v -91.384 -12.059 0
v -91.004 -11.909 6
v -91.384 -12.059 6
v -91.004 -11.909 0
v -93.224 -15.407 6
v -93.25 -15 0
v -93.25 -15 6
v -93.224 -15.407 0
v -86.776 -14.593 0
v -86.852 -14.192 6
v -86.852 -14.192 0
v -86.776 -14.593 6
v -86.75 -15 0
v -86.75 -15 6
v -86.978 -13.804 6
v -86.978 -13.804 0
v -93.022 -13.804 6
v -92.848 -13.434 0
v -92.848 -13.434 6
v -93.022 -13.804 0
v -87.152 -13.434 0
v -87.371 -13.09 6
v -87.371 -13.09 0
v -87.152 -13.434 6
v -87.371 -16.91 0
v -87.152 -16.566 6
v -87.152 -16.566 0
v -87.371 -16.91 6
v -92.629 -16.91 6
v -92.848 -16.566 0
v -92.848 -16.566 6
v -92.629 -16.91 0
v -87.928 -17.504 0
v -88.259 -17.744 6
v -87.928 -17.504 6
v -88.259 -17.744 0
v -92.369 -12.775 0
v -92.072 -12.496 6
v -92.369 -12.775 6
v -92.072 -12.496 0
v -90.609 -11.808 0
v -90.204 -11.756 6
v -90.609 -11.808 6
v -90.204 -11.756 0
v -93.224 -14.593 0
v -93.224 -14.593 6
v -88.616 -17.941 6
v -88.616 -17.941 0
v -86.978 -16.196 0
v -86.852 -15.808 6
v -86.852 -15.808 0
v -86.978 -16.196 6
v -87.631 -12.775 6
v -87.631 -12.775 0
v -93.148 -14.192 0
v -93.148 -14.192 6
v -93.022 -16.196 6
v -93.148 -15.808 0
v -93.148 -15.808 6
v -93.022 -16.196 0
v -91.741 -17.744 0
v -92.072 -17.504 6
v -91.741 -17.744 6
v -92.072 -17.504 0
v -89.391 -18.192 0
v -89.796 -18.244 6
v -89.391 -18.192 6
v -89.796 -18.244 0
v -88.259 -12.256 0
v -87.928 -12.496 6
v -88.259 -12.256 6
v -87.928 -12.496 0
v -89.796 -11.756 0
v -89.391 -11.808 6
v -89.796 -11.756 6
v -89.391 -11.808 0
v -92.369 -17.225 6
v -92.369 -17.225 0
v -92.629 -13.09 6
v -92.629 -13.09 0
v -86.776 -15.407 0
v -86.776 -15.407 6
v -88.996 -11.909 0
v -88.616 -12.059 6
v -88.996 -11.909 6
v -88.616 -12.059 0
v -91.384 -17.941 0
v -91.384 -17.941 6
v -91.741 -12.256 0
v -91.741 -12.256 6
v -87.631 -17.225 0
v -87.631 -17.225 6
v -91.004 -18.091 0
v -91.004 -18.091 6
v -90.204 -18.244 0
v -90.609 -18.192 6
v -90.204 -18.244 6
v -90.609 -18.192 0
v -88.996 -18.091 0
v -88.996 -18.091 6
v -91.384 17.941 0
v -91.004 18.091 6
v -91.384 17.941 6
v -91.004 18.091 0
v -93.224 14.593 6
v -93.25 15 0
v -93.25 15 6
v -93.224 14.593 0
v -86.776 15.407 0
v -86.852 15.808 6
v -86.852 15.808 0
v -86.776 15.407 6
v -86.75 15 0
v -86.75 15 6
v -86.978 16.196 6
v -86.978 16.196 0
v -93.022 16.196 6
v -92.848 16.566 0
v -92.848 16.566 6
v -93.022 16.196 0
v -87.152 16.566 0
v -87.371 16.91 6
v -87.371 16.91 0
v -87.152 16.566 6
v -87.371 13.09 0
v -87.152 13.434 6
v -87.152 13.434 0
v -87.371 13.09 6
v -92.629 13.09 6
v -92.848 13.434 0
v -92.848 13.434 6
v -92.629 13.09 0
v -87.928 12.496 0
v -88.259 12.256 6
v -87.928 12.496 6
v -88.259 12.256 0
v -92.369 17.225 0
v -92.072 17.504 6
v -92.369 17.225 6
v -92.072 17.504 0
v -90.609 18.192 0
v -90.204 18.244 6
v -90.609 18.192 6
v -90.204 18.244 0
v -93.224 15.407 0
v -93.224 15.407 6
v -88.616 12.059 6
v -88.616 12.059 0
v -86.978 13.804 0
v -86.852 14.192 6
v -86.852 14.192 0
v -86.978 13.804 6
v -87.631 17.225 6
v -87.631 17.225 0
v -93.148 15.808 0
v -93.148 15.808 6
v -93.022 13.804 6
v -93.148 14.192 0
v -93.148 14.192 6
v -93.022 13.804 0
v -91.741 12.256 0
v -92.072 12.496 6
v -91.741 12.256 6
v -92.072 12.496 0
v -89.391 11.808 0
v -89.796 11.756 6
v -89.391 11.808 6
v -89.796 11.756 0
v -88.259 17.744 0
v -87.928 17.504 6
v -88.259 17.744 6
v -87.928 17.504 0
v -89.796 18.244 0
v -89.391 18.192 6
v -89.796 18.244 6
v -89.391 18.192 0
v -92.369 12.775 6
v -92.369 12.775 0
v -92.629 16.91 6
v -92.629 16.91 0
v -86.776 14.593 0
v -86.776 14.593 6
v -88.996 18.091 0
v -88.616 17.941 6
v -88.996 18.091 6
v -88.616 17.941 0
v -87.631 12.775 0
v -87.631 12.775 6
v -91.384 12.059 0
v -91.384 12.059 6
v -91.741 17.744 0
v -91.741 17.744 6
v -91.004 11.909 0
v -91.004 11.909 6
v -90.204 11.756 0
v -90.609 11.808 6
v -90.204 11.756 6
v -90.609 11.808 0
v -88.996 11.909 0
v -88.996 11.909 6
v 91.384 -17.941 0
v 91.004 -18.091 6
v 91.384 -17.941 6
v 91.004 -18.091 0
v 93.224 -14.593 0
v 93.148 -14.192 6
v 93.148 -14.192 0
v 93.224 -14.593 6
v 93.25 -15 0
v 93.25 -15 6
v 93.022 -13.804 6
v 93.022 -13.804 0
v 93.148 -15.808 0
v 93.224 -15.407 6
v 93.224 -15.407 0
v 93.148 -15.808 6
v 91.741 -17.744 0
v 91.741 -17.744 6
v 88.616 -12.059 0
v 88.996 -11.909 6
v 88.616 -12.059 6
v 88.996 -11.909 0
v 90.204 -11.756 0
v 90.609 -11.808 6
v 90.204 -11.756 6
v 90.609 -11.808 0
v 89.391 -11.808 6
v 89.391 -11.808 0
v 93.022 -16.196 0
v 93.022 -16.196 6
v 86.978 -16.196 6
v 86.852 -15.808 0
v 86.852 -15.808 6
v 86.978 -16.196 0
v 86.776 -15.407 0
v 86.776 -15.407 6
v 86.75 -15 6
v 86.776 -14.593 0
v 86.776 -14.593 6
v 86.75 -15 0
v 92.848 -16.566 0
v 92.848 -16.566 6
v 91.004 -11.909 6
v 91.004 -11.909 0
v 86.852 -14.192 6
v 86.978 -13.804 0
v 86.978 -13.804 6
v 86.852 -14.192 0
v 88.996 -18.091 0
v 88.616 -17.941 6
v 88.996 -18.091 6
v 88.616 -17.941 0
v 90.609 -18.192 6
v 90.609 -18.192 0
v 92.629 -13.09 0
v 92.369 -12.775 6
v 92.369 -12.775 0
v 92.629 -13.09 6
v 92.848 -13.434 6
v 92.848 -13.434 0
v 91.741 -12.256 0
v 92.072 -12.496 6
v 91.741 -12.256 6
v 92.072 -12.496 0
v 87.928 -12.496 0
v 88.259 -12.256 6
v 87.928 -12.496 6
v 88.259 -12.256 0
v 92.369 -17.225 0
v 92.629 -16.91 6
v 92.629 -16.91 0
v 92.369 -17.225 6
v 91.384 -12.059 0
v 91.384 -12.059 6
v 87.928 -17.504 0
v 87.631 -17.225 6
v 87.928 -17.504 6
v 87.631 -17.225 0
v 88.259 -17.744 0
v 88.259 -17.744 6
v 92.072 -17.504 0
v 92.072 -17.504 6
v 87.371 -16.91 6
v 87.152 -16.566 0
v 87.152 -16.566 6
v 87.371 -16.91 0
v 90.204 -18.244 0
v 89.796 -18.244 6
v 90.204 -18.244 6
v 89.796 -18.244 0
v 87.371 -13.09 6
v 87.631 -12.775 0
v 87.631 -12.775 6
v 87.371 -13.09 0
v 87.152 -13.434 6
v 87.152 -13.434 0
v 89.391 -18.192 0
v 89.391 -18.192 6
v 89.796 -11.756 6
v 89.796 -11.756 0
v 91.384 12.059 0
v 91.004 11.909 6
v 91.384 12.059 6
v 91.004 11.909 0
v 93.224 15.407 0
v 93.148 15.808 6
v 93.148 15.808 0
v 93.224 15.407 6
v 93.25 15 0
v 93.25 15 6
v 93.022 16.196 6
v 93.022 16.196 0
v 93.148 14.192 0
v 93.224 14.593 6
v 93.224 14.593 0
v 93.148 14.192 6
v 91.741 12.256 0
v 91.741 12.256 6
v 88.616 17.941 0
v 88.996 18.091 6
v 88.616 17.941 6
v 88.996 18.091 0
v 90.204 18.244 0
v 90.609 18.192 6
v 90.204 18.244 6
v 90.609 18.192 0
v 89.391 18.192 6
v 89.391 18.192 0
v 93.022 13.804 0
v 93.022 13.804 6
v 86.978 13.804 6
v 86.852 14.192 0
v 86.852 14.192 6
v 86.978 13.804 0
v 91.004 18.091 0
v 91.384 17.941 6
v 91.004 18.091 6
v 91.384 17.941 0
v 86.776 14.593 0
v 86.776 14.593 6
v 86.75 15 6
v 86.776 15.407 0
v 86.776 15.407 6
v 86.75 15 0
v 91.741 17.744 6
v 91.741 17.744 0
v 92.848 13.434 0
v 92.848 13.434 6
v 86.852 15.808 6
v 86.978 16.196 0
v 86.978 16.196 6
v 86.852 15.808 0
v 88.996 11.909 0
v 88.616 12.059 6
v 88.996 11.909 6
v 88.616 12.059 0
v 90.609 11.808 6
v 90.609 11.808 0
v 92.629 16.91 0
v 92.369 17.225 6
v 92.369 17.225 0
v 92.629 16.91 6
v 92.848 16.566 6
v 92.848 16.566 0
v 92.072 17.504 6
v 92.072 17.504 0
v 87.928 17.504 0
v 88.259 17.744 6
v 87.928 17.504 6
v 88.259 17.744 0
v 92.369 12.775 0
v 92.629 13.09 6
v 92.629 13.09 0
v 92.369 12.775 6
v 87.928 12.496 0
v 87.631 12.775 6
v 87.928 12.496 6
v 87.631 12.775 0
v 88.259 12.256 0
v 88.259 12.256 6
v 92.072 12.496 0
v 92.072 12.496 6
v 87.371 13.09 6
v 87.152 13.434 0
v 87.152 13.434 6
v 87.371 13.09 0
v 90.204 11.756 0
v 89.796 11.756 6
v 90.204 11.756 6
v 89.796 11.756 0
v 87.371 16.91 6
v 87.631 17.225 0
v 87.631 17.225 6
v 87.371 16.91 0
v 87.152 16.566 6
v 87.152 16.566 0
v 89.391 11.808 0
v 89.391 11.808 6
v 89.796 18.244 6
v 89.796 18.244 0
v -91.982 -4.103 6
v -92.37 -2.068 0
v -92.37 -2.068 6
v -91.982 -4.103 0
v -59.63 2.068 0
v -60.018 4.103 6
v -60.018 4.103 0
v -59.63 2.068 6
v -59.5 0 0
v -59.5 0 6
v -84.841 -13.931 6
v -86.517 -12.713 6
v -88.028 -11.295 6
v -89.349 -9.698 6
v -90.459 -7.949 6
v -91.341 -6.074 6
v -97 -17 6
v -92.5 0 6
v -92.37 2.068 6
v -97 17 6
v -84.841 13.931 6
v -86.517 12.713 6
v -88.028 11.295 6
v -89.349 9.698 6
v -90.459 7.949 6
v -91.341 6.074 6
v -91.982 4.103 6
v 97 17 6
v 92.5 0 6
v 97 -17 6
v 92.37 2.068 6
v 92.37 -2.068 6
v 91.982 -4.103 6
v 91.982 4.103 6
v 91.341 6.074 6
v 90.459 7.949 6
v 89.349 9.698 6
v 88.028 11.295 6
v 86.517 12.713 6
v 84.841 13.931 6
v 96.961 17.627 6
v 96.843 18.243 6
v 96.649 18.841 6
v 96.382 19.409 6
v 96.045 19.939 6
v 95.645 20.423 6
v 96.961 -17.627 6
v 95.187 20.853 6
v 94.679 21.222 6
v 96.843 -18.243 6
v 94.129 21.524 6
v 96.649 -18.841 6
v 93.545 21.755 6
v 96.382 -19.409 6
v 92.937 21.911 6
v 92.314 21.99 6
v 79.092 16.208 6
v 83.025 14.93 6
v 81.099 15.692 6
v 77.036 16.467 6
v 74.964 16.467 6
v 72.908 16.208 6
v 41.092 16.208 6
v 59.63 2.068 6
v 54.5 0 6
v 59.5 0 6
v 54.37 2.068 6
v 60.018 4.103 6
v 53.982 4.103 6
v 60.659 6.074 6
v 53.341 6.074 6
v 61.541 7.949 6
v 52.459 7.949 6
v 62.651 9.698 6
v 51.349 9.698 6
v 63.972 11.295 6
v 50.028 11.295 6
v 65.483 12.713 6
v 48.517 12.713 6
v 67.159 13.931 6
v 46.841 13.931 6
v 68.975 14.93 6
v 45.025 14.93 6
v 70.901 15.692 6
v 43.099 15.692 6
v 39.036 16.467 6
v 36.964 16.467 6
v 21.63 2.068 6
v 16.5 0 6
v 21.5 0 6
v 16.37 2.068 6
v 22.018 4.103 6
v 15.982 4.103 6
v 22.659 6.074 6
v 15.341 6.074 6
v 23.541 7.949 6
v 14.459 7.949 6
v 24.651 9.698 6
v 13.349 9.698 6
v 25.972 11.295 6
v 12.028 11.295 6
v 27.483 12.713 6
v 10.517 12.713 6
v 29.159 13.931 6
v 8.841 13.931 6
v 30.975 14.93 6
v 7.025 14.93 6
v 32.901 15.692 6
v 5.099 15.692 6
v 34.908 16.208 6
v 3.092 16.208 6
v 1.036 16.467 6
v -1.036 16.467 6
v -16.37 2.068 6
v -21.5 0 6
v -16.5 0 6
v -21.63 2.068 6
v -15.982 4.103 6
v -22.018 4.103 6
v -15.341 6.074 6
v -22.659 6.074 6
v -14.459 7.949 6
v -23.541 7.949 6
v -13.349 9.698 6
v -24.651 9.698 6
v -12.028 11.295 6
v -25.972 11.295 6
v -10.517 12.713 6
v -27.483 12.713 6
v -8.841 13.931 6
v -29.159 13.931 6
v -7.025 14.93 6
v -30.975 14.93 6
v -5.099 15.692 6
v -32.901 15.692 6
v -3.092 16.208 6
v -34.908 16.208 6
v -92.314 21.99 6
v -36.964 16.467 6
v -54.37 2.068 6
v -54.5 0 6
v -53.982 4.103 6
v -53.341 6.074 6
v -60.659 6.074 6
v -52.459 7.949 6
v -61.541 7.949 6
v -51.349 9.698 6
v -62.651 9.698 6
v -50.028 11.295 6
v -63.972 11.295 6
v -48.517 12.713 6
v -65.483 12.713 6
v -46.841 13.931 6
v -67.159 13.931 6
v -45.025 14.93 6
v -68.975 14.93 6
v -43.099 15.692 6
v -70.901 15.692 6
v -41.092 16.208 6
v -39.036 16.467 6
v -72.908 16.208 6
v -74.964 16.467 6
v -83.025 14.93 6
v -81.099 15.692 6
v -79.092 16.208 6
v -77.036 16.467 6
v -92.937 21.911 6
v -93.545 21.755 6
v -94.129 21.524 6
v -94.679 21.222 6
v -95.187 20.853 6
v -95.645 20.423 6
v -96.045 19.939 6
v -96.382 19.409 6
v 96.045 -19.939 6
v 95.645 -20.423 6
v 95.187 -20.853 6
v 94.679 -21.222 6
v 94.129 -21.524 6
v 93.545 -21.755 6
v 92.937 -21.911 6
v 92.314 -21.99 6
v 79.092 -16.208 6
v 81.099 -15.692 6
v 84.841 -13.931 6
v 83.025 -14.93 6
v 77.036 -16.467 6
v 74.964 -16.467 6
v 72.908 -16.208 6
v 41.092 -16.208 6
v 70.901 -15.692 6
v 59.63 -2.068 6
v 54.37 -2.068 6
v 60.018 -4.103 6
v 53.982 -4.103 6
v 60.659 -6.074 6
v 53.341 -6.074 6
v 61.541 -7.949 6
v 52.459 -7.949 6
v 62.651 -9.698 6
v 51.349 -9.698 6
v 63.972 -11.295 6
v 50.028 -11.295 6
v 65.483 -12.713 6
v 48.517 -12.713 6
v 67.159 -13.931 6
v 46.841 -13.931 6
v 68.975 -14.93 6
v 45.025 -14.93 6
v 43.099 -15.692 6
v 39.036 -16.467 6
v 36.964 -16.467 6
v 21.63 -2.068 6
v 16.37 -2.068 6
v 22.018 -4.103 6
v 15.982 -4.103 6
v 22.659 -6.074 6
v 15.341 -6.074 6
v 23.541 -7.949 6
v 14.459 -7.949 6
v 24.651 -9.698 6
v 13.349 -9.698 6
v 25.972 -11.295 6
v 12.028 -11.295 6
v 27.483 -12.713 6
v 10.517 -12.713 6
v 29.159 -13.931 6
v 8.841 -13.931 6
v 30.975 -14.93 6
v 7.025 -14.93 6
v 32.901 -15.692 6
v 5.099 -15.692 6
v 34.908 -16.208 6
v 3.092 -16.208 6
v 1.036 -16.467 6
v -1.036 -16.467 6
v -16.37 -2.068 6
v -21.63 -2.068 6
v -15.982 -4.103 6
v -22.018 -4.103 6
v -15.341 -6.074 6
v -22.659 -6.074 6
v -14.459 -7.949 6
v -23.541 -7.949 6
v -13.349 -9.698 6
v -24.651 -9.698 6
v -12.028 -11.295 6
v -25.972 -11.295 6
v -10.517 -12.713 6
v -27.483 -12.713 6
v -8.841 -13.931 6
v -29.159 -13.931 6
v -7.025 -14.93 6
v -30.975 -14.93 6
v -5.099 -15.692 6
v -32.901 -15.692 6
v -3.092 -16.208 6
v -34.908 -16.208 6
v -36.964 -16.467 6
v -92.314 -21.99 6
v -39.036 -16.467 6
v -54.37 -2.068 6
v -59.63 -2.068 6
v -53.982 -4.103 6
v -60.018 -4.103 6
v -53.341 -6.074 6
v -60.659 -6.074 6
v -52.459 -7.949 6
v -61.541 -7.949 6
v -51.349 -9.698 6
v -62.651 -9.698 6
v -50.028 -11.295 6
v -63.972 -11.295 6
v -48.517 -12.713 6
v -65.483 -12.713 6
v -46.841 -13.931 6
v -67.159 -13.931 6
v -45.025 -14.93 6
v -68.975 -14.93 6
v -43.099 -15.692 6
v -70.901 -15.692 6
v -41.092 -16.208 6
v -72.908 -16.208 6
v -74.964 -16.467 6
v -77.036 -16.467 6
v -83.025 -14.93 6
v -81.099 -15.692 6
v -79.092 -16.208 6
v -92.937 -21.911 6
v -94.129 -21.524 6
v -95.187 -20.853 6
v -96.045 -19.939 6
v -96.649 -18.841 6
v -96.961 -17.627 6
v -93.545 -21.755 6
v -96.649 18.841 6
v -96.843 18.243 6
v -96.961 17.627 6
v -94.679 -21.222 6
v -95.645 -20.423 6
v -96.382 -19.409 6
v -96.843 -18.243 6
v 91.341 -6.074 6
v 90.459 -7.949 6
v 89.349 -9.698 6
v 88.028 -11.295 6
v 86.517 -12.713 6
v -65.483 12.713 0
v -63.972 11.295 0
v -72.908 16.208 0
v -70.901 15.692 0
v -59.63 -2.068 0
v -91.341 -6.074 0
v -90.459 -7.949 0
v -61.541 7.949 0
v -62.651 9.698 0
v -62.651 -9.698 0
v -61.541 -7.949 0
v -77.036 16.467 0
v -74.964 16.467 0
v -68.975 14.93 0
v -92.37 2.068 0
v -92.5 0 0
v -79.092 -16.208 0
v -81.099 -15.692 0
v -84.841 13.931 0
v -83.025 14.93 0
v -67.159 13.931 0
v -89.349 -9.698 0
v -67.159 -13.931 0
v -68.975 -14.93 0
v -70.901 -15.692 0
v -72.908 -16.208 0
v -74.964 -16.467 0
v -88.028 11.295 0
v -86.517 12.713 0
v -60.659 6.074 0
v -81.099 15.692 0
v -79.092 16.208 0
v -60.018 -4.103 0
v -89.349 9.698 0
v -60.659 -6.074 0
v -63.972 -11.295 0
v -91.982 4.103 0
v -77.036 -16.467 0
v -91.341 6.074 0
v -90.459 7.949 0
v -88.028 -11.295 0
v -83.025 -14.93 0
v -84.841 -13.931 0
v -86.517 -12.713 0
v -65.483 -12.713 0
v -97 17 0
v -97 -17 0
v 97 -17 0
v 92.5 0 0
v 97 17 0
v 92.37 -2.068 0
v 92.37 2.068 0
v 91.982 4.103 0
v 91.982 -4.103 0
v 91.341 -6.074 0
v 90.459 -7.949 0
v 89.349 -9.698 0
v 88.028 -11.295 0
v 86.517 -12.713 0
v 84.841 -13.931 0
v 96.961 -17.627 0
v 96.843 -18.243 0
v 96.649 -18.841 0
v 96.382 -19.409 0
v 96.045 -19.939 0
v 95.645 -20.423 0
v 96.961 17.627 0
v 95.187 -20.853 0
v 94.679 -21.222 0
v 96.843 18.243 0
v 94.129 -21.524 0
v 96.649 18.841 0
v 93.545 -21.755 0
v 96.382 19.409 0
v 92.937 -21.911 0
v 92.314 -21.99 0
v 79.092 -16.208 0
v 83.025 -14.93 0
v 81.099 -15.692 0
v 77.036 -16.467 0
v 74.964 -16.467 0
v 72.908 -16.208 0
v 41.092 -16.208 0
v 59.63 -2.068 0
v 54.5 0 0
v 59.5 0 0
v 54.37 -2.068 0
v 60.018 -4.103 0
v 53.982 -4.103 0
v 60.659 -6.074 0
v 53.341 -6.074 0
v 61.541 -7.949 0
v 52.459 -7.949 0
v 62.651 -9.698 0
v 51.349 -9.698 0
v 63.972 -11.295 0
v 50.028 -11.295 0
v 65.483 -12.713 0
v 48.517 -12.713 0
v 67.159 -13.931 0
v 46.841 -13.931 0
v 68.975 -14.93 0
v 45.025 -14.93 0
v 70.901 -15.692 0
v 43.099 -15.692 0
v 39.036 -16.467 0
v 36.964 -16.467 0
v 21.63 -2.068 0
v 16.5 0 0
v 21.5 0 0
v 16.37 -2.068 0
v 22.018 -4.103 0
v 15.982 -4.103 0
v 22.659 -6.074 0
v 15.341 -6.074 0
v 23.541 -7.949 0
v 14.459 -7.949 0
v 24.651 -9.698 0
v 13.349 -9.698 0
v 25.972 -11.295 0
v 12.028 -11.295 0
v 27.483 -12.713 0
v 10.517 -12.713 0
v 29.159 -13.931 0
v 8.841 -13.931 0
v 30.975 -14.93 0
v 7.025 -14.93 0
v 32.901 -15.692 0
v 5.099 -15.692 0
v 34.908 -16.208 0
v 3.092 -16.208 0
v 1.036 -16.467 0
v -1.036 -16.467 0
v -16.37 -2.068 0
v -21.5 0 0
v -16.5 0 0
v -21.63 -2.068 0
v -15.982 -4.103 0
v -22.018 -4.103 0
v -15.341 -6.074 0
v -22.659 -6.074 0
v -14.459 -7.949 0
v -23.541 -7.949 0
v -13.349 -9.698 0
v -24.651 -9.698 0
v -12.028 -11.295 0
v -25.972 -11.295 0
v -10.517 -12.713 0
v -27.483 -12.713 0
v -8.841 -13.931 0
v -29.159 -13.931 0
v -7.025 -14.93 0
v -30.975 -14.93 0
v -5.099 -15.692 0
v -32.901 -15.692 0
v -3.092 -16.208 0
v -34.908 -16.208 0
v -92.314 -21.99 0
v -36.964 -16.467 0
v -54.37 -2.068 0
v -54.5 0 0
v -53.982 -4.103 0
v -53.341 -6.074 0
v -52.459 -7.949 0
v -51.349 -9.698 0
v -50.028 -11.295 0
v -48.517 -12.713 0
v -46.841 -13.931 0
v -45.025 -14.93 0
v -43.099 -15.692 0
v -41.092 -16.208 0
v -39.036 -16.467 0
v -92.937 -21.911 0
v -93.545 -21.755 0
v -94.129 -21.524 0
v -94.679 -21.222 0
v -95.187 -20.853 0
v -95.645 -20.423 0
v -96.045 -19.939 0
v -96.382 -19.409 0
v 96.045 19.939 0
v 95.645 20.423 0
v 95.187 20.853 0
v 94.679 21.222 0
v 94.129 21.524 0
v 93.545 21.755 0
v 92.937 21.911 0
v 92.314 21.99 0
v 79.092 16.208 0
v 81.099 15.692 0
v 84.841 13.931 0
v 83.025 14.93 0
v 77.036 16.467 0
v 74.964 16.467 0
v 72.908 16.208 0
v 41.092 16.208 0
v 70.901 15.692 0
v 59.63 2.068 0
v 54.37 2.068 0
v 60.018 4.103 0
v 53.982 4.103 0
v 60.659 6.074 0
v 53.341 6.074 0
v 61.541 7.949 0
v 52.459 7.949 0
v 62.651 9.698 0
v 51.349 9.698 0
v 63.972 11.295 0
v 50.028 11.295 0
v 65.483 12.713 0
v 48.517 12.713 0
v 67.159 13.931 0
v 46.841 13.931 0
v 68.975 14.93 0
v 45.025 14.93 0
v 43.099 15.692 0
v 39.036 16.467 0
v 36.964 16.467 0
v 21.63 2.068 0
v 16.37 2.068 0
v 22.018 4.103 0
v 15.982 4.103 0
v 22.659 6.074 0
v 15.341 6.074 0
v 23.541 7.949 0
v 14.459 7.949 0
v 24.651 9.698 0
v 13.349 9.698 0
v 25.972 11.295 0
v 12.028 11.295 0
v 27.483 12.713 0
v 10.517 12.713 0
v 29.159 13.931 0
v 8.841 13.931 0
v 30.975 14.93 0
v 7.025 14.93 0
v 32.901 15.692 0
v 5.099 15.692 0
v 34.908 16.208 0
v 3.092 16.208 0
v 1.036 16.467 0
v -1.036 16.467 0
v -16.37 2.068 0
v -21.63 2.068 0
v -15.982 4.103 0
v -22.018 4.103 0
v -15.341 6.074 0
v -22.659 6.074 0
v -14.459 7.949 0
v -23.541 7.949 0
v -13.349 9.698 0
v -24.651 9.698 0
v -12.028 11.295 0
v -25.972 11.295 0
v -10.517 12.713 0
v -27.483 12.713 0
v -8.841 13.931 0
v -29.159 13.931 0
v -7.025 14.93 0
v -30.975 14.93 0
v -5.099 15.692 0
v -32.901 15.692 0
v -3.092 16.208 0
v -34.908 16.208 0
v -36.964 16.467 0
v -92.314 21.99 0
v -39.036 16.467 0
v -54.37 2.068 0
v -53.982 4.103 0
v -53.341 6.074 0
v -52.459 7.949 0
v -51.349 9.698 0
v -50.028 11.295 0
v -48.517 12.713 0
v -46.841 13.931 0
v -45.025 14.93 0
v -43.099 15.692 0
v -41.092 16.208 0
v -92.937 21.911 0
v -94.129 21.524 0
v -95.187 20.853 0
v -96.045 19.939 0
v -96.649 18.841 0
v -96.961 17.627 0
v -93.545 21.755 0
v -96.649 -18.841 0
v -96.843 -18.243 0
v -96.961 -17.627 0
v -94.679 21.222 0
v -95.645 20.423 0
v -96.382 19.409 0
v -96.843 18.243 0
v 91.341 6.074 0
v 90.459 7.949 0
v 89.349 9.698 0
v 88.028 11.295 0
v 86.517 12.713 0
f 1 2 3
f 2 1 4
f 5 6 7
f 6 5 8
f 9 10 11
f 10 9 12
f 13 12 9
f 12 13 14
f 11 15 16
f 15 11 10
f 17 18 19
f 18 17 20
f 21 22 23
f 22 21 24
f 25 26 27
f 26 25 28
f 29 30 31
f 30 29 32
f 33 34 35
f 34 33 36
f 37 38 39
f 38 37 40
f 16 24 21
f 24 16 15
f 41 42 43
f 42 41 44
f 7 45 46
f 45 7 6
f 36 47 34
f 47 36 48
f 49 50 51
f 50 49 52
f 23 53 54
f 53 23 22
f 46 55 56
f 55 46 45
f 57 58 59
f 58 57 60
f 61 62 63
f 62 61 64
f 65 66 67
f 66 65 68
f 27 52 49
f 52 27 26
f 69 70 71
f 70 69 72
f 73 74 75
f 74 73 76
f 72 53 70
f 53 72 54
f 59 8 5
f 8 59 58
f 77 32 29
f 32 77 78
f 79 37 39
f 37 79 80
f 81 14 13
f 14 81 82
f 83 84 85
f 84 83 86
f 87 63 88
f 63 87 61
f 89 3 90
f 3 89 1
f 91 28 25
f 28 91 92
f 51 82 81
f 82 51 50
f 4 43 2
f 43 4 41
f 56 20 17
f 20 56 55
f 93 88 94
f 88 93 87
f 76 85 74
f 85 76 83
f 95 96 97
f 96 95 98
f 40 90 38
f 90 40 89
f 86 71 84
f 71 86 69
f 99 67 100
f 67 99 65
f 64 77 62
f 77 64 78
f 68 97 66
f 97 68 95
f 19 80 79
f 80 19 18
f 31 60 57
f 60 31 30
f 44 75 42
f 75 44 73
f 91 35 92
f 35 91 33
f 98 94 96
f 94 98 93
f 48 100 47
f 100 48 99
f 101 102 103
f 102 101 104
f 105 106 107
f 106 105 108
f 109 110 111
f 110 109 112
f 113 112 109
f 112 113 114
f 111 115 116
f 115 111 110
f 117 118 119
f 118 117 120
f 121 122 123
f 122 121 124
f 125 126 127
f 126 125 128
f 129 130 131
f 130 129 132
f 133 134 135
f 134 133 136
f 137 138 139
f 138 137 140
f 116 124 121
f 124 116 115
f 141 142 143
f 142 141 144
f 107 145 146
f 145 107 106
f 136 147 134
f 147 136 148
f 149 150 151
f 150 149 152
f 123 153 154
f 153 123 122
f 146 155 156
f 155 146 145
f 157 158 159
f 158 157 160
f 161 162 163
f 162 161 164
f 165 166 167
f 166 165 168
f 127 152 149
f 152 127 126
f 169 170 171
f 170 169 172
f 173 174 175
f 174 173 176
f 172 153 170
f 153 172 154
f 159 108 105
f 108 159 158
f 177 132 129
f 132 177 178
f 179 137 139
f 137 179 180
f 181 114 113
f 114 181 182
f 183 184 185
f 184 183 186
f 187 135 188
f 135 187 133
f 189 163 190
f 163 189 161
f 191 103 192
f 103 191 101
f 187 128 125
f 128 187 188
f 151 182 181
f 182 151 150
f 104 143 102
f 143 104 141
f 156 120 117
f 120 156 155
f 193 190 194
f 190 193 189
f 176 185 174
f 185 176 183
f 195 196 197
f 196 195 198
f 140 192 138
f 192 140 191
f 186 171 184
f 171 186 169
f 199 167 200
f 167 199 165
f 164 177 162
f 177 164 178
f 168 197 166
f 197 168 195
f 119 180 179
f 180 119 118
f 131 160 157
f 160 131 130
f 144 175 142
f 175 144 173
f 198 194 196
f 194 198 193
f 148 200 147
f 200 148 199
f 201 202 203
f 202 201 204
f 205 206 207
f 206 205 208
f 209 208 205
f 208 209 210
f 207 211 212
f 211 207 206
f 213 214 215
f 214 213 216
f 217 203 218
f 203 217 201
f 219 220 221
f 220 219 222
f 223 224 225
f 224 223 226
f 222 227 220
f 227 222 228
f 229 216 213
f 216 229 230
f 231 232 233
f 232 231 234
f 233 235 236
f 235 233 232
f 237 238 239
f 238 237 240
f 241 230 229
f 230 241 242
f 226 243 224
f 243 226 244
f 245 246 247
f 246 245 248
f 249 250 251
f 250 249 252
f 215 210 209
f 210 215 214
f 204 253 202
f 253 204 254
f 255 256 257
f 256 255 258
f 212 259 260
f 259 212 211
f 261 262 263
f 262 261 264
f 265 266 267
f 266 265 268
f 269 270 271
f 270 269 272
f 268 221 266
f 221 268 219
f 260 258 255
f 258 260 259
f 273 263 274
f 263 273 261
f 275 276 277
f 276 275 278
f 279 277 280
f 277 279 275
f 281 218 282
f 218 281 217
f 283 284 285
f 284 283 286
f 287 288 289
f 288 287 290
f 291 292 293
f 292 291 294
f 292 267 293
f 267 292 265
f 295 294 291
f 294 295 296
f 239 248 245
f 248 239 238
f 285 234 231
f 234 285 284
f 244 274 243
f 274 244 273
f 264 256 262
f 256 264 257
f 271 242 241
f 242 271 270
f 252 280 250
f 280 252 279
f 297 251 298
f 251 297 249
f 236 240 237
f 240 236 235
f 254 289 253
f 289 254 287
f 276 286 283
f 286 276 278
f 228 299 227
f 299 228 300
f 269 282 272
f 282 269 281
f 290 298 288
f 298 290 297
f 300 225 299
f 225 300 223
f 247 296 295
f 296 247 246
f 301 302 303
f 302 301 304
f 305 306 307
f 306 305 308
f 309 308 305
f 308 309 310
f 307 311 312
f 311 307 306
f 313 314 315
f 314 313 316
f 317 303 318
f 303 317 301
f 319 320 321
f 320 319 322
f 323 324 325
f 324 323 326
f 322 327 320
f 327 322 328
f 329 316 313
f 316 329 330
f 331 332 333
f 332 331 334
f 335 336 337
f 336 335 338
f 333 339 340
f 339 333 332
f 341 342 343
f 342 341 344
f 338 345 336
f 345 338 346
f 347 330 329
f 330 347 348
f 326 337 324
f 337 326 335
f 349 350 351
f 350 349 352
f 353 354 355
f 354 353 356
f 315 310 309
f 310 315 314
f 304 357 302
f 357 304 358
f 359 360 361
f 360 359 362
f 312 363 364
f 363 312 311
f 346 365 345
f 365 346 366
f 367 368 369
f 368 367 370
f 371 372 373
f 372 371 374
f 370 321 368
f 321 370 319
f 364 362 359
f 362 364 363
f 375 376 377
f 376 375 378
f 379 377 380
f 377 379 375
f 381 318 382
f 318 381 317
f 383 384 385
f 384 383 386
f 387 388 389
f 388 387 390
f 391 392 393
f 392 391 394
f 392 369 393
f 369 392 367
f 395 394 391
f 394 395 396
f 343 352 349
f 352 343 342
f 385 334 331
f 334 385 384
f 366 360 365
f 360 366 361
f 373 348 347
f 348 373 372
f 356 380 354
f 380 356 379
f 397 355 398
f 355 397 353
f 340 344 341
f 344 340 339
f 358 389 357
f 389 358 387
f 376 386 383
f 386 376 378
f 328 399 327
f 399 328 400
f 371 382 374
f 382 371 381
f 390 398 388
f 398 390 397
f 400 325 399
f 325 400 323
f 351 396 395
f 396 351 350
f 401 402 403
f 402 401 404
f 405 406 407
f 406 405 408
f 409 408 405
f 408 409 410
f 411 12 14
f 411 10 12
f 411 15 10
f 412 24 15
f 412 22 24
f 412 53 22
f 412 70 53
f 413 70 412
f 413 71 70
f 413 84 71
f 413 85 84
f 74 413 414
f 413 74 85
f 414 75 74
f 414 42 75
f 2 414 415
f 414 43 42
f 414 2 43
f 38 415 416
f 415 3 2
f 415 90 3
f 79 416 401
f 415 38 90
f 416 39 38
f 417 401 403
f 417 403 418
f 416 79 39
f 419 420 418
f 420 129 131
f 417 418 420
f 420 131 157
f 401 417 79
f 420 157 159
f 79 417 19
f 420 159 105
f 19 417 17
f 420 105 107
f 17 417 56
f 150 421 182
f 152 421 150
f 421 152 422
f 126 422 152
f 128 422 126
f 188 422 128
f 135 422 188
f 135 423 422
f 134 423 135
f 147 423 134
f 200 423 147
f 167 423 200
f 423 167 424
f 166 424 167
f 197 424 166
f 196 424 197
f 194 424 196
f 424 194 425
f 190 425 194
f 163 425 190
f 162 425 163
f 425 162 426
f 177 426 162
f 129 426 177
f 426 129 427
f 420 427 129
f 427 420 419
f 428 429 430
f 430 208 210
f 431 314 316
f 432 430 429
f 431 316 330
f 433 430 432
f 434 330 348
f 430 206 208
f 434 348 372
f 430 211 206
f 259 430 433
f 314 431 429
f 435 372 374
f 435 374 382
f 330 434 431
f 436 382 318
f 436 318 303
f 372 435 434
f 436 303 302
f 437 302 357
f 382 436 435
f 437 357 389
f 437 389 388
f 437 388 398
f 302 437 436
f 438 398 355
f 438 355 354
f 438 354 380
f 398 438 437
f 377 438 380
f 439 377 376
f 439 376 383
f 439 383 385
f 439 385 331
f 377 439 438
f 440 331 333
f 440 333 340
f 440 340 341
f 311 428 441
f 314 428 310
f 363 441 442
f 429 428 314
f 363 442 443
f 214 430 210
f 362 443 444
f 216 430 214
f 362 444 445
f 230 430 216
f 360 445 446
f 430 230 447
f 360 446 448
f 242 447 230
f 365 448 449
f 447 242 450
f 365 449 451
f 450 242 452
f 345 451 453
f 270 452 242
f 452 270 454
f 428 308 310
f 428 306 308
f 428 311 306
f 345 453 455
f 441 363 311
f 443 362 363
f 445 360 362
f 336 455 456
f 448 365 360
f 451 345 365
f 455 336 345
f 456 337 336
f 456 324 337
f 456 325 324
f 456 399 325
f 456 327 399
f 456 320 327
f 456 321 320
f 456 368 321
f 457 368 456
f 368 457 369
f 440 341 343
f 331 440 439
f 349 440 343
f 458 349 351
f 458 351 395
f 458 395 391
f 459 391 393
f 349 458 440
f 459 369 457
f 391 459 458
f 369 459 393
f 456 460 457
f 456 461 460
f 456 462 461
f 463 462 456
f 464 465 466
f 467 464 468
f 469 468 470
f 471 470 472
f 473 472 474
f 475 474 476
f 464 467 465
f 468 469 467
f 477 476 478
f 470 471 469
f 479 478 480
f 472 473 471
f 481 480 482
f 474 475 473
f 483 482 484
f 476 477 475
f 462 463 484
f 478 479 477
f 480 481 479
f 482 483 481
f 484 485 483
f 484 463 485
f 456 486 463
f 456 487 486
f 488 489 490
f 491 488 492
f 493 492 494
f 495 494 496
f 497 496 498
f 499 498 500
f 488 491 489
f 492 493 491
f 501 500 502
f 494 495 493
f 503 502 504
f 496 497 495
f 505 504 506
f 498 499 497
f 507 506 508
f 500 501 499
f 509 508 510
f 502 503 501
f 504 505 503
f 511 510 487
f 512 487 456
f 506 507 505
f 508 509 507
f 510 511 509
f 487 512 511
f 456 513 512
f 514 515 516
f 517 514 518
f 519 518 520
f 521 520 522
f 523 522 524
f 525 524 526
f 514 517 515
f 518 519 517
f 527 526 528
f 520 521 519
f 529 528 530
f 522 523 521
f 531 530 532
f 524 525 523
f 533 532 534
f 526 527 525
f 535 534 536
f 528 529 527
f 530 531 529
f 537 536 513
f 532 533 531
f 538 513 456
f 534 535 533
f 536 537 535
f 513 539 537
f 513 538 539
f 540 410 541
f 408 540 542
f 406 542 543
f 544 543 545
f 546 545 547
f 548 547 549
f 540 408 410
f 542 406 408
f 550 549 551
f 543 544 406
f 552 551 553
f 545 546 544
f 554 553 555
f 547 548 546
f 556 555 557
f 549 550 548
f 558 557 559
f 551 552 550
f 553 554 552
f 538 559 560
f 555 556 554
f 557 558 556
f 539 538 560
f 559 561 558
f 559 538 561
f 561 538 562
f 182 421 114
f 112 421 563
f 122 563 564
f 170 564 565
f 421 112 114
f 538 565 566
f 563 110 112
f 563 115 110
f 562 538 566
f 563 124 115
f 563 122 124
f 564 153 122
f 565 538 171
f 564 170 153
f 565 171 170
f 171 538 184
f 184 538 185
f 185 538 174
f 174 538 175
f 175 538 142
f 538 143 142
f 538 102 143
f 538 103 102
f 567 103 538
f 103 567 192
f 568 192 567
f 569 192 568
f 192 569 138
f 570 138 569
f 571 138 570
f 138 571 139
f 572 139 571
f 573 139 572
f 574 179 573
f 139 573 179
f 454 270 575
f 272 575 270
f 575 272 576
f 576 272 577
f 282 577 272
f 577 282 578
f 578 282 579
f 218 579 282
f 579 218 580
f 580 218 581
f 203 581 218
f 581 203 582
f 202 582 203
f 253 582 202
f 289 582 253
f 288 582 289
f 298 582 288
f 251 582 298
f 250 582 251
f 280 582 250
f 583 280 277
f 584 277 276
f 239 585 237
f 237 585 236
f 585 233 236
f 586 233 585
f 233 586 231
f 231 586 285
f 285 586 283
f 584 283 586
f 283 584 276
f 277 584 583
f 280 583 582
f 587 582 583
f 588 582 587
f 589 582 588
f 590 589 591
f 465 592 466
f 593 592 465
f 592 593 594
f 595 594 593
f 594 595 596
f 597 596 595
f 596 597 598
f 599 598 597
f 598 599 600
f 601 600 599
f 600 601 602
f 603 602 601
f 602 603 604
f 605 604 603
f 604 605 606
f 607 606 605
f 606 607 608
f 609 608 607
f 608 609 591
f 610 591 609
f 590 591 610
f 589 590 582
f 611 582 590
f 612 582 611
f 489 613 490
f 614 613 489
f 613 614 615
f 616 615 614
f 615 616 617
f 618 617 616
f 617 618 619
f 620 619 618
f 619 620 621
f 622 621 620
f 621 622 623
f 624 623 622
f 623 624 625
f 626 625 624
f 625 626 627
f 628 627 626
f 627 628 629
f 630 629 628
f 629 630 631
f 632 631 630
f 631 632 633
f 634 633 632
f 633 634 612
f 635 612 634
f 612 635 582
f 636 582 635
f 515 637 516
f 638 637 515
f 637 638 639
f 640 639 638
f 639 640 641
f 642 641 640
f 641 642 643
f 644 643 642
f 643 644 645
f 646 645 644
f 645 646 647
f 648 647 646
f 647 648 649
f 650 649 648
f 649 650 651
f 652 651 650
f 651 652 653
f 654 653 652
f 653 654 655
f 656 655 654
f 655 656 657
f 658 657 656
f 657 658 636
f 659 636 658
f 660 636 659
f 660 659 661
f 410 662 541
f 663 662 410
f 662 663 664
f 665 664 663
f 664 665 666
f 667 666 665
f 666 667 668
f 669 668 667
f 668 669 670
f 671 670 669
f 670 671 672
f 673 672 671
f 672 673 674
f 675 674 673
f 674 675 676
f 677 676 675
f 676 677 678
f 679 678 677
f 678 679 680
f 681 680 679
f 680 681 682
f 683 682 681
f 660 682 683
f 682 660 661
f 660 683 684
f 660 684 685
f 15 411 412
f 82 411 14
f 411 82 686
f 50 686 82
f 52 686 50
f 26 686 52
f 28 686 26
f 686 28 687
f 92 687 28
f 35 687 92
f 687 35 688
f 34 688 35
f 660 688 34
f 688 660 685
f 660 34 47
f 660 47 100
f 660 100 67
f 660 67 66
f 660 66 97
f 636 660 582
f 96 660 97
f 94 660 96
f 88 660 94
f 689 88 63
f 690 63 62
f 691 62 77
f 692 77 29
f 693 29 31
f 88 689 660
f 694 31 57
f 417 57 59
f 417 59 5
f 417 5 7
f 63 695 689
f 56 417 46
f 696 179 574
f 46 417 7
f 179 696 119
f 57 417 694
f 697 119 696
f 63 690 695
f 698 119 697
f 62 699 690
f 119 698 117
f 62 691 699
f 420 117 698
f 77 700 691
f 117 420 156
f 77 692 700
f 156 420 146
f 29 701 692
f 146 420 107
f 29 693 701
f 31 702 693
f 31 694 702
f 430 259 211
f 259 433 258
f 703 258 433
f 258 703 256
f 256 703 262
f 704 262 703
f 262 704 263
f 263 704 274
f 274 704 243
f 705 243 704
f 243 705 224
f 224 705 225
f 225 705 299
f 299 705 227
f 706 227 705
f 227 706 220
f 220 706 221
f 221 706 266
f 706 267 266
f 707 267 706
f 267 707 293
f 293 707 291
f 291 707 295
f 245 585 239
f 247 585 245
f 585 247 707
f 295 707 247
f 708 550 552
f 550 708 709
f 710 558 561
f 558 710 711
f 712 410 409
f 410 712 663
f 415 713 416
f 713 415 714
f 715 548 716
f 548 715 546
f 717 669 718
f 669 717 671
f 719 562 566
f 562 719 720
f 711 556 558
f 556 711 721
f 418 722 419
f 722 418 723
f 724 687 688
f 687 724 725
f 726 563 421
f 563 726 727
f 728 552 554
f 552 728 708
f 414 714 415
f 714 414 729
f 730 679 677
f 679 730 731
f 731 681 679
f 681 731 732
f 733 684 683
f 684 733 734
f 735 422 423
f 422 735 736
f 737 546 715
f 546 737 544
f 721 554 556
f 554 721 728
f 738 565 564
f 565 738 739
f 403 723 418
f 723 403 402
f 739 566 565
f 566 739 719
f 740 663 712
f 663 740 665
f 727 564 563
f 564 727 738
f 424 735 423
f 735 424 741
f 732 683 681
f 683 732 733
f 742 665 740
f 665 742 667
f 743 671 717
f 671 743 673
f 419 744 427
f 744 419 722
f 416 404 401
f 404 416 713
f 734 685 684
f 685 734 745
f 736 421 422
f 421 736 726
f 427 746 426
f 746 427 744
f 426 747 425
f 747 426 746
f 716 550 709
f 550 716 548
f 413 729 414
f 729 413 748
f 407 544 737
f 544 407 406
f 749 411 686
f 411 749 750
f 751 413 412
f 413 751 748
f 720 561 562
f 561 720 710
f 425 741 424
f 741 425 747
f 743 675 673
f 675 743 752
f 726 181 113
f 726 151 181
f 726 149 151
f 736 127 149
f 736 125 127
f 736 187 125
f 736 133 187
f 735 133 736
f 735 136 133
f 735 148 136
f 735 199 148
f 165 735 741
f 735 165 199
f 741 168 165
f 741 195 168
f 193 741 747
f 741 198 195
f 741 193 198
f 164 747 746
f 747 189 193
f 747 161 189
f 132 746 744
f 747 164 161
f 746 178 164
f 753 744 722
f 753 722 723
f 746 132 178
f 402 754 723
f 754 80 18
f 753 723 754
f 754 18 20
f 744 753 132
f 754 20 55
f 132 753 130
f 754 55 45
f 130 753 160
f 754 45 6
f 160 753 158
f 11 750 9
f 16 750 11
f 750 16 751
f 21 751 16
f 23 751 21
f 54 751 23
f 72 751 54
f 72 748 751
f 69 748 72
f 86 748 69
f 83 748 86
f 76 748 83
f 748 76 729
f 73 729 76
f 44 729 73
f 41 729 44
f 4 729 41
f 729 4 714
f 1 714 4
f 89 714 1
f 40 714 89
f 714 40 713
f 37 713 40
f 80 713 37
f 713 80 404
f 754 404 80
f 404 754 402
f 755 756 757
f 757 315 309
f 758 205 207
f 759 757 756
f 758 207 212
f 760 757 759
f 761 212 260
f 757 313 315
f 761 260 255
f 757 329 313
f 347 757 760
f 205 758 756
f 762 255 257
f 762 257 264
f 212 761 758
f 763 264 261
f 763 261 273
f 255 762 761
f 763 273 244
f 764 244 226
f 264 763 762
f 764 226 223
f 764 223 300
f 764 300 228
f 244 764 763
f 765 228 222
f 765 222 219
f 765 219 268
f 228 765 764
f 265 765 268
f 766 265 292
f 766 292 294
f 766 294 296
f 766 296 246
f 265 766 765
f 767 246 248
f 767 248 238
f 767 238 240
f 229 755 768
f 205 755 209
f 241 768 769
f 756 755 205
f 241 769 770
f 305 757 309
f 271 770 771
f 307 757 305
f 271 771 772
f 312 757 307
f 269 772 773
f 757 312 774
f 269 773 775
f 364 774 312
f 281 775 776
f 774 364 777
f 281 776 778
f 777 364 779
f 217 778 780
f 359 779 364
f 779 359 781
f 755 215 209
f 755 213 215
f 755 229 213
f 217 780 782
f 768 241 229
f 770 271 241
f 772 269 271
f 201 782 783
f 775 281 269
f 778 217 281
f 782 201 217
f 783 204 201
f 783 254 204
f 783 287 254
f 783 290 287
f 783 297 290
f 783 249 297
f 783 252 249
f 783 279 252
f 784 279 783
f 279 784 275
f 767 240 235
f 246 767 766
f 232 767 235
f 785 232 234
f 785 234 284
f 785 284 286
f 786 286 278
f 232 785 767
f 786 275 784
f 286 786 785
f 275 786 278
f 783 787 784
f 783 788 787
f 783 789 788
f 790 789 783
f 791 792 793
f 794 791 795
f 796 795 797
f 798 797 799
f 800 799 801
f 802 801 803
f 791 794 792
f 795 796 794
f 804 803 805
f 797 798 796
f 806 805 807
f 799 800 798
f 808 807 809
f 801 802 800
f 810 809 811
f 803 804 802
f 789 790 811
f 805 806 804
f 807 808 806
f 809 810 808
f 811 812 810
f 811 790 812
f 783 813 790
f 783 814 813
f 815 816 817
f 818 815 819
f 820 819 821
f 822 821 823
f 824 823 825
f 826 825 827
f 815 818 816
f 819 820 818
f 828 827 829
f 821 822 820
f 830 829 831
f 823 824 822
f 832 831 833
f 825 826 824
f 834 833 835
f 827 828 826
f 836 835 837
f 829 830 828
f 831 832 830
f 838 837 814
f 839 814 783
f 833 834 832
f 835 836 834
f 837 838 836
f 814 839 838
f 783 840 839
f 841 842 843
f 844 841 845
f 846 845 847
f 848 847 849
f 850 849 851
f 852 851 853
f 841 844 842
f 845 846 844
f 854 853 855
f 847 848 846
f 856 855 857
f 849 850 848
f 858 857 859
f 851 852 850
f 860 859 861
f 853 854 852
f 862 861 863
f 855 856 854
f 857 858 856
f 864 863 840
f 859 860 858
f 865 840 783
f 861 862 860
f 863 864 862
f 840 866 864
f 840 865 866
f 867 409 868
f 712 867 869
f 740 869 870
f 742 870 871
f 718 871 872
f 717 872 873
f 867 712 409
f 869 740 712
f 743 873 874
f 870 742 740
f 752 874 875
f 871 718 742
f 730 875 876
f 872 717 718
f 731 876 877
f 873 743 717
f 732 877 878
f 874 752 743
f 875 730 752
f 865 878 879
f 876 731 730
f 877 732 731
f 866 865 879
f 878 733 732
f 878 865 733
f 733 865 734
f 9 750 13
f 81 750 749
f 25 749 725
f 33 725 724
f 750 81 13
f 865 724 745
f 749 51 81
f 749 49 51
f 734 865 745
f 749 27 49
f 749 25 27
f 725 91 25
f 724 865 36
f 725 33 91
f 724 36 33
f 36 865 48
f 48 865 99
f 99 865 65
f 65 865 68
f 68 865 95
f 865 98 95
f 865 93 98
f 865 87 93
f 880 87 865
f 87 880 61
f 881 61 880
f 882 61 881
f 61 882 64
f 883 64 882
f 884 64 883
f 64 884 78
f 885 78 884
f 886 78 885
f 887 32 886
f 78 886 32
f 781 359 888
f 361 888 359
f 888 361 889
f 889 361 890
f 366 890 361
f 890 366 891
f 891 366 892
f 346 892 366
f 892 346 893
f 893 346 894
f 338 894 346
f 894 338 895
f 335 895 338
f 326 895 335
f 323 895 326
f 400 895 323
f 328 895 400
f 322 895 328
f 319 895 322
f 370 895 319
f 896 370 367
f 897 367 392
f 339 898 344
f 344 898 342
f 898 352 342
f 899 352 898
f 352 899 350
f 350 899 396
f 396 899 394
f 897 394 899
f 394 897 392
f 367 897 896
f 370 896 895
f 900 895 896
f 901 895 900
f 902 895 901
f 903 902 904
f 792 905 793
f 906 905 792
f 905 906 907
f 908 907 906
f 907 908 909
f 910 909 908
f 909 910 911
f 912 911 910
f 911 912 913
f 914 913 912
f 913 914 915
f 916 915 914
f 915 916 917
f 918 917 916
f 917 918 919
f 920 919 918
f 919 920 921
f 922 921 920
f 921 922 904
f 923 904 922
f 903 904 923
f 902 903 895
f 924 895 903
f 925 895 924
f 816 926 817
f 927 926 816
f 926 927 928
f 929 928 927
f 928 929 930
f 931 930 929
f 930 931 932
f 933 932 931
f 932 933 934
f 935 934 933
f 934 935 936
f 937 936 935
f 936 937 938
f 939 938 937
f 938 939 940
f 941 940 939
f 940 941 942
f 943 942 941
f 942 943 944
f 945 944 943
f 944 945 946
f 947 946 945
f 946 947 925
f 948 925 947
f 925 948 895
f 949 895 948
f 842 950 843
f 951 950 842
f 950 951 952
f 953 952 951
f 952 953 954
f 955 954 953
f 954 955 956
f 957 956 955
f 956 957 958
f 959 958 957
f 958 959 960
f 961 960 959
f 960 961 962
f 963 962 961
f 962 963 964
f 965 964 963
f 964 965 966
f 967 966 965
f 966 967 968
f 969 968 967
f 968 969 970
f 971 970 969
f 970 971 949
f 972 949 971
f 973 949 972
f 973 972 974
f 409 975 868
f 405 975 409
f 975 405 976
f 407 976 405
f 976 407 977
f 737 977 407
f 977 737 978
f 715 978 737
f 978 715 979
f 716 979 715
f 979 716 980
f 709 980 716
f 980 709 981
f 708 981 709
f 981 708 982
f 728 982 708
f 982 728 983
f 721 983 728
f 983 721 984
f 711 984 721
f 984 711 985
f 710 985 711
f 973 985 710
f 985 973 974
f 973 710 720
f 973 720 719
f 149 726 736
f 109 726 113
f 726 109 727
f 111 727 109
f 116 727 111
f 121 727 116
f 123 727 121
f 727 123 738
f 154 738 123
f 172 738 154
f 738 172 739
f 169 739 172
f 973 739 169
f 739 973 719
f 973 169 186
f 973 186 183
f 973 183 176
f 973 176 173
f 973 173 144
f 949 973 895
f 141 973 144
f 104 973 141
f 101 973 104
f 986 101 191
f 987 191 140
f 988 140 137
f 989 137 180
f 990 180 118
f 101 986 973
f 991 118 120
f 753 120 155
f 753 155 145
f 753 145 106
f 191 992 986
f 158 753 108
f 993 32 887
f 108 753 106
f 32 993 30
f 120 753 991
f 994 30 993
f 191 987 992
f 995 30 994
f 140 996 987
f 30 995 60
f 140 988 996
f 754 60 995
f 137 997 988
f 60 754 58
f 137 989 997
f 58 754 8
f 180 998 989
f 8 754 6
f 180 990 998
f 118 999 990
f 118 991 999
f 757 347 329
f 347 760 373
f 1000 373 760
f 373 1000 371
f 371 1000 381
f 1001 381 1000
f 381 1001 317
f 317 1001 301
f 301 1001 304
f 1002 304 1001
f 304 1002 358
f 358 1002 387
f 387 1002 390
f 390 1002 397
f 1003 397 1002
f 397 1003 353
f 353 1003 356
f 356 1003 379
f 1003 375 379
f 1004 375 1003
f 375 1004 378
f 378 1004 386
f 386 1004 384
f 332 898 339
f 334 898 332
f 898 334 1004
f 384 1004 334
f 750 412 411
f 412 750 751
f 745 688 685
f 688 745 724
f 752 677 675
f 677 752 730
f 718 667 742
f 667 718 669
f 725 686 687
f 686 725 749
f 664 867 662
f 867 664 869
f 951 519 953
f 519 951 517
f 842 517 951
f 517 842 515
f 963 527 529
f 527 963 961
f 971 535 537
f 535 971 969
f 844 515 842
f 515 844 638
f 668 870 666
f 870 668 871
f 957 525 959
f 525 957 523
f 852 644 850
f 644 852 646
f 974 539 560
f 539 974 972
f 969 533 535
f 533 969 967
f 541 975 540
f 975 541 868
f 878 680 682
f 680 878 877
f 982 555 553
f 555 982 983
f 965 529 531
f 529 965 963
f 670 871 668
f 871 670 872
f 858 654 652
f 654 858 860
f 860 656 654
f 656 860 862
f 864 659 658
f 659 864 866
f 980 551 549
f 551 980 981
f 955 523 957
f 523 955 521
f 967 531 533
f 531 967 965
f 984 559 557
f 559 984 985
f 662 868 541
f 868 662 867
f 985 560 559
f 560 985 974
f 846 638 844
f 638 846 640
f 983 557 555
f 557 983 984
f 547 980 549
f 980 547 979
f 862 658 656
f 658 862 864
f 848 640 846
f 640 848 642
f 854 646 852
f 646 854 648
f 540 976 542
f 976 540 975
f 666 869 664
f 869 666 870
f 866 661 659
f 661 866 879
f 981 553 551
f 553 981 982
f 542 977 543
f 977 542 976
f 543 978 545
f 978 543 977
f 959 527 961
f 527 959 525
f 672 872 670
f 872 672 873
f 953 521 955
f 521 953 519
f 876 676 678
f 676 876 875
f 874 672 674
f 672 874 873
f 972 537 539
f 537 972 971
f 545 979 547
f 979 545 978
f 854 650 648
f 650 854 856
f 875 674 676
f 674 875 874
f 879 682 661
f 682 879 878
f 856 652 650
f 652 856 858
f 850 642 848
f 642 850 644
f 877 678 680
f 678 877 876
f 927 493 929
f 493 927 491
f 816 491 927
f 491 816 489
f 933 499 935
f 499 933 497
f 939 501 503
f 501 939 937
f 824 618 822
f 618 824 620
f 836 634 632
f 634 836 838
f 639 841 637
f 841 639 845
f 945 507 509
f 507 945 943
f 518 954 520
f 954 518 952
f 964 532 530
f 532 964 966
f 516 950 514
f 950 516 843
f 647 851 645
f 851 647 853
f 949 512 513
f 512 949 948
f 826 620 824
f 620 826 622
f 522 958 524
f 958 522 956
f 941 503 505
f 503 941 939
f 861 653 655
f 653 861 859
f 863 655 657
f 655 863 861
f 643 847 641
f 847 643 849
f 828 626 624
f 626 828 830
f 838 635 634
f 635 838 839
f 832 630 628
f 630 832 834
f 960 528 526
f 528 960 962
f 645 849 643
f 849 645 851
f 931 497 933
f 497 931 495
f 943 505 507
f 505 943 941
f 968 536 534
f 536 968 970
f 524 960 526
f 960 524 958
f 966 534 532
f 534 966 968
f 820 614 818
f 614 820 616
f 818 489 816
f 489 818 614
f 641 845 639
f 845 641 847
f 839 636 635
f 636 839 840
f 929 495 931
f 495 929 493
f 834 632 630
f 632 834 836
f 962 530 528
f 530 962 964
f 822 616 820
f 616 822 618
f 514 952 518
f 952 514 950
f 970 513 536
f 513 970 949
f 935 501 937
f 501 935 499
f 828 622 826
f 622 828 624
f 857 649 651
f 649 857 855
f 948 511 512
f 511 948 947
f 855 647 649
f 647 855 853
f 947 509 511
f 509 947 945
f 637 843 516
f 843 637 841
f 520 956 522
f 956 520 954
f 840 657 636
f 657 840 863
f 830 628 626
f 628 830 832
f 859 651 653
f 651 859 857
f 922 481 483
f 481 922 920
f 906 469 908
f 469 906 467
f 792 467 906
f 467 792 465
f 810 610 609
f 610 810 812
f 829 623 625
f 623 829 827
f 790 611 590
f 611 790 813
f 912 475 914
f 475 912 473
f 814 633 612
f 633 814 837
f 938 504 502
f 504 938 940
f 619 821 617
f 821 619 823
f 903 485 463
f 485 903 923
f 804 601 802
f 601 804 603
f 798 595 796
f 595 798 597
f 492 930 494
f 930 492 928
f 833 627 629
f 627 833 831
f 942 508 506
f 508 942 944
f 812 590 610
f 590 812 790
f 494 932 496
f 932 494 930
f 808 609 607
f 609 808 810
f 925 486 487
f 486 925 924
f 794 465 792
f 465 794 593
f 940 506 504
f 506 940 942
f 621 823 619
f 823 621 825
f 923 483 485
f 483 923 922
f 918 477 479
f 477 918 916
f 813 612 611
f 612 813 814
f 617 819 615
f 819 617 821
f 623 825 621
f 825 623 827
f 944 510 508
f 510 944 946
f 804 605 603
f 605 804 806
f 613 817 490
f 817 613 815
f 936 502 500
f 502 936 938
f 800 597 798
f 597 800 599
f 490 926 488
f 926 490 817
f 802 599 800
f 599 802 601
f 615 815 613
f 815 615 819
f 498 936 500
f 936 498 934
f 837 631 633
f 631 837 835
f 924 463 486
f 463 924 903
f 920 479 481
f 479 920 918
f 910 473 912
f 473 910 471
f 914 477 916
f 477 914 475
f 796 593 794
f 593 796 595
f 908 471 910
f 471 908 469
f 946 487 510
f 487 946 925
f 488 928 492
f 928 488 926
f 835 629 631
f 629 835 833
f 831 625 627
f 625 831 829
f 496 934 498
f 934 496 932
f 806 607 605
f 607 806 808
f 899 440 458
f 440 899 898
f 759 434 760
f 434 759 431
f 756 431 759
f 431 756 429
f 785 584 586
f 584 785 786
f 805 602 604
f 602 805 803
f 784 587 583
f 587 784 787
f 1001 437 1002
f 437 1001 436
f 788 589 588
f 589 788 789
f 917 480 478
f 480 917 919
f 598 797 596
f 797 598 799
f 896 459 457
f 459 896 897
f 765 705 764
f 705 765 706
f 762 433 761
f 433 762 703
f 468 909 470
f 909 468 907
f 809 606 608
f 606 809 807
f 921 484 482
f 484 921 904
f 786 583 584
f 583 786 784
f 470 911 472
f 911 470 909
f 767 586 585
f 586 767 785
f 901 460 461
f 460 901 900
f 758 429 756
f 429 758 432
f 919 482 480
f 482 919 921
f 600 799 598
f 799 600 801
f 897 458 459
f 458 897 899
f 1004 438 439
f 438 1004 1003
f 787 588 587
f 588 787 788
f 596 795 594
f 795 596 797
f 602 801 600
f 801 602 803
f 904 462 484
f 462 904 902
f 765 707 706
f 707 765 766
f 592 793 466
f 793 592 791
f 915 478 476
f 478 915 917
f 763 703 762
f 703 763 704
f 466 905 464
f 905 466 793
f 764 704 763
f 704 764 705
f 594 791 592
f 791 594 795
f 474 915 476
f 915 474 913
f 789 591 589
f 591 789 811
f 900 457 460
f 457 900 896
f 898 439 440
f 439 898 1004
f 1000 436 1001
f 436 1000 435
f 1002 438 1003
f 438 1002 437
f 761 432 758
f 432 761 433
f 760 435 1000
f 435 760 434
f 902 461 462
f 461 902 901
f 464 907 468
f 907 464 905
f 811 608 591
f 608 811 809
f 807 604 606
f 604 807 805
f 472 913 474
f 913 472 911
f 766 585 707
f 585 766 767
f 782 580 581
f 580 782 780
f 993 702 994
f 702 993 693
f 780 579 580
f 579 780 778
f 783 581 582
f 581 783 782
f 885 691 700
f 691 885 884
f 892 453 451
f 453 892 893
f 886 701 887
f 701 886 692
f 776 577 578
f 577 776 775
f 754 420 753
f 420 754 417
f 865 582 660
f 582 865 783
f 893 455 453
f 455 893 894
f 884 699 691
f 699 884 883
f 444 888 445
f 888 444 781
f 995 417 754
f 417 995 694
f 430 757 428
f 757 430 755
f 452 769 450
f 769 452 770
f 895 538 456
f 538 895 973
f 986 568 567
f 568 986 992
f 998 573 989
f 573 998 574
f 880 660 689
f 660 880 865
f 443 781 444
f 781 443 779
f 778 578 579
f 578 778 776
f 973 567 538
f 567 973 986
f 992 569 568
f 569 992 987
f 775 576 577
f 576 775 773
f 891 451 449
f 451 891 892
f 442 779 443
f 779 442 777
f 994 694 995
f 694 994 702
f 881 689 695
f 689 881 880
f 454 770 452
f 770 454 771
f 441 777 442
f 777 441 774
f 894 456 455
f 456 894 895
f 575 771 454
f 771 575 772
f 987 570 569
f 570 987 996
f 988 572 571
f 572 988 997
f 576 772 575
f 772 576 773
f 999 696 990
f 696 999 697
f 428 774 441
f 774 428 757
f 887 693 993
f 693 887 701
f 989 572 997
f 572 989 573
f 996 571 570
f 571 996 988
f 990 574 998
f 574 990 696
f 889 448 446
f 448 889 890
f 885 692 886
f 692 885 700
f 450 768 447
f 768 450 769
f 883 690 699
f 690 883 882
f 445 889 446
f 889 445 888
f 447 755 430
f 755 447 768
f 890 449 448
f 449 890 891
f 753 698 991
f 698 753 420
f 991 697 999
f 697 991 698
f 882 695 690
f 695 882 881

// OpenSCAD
$fn = 50;


difference() {
	union() {
		hull() {
			translate(v = [-92.0000000000, 17.0000000000, 0]) {
				cylinder(h = 6, r = 5);
			}
			translate(v = [92.0000000000, 17.0000000000, 0]) {
				cylinder(h = 6, r = 5);
			}
			translate(v = [-92.0000000000, -17.0000000000, 0]) {
				cylinder(h = 6, r = 5);
			}
			translate(v = [92.0000000000, -17.0000000000, 0]) {
				cylinder(h = 6, r = 5);
			}
		}
	}
	union() {
		#translate(v = [-90.0000000000, -15.0000000000, -100.0000000000]) {
			cylinder(h = 200, r = 3.2500000000);
		}
		#translate(v = [-90.0000000000, 15.0000000000, -100.0000000000]) {
			cylinder(h = 200, r = 3.2500000000);
		}
		#translate(v = [90.0000000000, -15.0000000000, -100.0000000000]) {
			cylinder(h = 200, r = 3.2500000000);
		}
		#translate(v = [90.0000000000, 15.0000000000, -100.0000000000]) {
			cylinder(h = 200, r = 3.2500000000);
		}
		#translate(v = [-76.0000000000, 0, 0]) {
			cylinder(h = 6, r = 16.5000000000);
		}
		#translate(v = [-38.0000000000, 0, 0]) {
			cylinder(h = 6, r = 16.5000000000);
		}
		#cylinder(h = 6, r = 16.5000000000);
		#translate(v = [38.0000000000, 0, 0]) {
			cylinder(h = 6, r = 16.5000000000);
		}
		#translate(v = [76.0000000000, 0, 0]) {
			cylinder(h = 6, r = 16.5000000000);
		}
	}
}
